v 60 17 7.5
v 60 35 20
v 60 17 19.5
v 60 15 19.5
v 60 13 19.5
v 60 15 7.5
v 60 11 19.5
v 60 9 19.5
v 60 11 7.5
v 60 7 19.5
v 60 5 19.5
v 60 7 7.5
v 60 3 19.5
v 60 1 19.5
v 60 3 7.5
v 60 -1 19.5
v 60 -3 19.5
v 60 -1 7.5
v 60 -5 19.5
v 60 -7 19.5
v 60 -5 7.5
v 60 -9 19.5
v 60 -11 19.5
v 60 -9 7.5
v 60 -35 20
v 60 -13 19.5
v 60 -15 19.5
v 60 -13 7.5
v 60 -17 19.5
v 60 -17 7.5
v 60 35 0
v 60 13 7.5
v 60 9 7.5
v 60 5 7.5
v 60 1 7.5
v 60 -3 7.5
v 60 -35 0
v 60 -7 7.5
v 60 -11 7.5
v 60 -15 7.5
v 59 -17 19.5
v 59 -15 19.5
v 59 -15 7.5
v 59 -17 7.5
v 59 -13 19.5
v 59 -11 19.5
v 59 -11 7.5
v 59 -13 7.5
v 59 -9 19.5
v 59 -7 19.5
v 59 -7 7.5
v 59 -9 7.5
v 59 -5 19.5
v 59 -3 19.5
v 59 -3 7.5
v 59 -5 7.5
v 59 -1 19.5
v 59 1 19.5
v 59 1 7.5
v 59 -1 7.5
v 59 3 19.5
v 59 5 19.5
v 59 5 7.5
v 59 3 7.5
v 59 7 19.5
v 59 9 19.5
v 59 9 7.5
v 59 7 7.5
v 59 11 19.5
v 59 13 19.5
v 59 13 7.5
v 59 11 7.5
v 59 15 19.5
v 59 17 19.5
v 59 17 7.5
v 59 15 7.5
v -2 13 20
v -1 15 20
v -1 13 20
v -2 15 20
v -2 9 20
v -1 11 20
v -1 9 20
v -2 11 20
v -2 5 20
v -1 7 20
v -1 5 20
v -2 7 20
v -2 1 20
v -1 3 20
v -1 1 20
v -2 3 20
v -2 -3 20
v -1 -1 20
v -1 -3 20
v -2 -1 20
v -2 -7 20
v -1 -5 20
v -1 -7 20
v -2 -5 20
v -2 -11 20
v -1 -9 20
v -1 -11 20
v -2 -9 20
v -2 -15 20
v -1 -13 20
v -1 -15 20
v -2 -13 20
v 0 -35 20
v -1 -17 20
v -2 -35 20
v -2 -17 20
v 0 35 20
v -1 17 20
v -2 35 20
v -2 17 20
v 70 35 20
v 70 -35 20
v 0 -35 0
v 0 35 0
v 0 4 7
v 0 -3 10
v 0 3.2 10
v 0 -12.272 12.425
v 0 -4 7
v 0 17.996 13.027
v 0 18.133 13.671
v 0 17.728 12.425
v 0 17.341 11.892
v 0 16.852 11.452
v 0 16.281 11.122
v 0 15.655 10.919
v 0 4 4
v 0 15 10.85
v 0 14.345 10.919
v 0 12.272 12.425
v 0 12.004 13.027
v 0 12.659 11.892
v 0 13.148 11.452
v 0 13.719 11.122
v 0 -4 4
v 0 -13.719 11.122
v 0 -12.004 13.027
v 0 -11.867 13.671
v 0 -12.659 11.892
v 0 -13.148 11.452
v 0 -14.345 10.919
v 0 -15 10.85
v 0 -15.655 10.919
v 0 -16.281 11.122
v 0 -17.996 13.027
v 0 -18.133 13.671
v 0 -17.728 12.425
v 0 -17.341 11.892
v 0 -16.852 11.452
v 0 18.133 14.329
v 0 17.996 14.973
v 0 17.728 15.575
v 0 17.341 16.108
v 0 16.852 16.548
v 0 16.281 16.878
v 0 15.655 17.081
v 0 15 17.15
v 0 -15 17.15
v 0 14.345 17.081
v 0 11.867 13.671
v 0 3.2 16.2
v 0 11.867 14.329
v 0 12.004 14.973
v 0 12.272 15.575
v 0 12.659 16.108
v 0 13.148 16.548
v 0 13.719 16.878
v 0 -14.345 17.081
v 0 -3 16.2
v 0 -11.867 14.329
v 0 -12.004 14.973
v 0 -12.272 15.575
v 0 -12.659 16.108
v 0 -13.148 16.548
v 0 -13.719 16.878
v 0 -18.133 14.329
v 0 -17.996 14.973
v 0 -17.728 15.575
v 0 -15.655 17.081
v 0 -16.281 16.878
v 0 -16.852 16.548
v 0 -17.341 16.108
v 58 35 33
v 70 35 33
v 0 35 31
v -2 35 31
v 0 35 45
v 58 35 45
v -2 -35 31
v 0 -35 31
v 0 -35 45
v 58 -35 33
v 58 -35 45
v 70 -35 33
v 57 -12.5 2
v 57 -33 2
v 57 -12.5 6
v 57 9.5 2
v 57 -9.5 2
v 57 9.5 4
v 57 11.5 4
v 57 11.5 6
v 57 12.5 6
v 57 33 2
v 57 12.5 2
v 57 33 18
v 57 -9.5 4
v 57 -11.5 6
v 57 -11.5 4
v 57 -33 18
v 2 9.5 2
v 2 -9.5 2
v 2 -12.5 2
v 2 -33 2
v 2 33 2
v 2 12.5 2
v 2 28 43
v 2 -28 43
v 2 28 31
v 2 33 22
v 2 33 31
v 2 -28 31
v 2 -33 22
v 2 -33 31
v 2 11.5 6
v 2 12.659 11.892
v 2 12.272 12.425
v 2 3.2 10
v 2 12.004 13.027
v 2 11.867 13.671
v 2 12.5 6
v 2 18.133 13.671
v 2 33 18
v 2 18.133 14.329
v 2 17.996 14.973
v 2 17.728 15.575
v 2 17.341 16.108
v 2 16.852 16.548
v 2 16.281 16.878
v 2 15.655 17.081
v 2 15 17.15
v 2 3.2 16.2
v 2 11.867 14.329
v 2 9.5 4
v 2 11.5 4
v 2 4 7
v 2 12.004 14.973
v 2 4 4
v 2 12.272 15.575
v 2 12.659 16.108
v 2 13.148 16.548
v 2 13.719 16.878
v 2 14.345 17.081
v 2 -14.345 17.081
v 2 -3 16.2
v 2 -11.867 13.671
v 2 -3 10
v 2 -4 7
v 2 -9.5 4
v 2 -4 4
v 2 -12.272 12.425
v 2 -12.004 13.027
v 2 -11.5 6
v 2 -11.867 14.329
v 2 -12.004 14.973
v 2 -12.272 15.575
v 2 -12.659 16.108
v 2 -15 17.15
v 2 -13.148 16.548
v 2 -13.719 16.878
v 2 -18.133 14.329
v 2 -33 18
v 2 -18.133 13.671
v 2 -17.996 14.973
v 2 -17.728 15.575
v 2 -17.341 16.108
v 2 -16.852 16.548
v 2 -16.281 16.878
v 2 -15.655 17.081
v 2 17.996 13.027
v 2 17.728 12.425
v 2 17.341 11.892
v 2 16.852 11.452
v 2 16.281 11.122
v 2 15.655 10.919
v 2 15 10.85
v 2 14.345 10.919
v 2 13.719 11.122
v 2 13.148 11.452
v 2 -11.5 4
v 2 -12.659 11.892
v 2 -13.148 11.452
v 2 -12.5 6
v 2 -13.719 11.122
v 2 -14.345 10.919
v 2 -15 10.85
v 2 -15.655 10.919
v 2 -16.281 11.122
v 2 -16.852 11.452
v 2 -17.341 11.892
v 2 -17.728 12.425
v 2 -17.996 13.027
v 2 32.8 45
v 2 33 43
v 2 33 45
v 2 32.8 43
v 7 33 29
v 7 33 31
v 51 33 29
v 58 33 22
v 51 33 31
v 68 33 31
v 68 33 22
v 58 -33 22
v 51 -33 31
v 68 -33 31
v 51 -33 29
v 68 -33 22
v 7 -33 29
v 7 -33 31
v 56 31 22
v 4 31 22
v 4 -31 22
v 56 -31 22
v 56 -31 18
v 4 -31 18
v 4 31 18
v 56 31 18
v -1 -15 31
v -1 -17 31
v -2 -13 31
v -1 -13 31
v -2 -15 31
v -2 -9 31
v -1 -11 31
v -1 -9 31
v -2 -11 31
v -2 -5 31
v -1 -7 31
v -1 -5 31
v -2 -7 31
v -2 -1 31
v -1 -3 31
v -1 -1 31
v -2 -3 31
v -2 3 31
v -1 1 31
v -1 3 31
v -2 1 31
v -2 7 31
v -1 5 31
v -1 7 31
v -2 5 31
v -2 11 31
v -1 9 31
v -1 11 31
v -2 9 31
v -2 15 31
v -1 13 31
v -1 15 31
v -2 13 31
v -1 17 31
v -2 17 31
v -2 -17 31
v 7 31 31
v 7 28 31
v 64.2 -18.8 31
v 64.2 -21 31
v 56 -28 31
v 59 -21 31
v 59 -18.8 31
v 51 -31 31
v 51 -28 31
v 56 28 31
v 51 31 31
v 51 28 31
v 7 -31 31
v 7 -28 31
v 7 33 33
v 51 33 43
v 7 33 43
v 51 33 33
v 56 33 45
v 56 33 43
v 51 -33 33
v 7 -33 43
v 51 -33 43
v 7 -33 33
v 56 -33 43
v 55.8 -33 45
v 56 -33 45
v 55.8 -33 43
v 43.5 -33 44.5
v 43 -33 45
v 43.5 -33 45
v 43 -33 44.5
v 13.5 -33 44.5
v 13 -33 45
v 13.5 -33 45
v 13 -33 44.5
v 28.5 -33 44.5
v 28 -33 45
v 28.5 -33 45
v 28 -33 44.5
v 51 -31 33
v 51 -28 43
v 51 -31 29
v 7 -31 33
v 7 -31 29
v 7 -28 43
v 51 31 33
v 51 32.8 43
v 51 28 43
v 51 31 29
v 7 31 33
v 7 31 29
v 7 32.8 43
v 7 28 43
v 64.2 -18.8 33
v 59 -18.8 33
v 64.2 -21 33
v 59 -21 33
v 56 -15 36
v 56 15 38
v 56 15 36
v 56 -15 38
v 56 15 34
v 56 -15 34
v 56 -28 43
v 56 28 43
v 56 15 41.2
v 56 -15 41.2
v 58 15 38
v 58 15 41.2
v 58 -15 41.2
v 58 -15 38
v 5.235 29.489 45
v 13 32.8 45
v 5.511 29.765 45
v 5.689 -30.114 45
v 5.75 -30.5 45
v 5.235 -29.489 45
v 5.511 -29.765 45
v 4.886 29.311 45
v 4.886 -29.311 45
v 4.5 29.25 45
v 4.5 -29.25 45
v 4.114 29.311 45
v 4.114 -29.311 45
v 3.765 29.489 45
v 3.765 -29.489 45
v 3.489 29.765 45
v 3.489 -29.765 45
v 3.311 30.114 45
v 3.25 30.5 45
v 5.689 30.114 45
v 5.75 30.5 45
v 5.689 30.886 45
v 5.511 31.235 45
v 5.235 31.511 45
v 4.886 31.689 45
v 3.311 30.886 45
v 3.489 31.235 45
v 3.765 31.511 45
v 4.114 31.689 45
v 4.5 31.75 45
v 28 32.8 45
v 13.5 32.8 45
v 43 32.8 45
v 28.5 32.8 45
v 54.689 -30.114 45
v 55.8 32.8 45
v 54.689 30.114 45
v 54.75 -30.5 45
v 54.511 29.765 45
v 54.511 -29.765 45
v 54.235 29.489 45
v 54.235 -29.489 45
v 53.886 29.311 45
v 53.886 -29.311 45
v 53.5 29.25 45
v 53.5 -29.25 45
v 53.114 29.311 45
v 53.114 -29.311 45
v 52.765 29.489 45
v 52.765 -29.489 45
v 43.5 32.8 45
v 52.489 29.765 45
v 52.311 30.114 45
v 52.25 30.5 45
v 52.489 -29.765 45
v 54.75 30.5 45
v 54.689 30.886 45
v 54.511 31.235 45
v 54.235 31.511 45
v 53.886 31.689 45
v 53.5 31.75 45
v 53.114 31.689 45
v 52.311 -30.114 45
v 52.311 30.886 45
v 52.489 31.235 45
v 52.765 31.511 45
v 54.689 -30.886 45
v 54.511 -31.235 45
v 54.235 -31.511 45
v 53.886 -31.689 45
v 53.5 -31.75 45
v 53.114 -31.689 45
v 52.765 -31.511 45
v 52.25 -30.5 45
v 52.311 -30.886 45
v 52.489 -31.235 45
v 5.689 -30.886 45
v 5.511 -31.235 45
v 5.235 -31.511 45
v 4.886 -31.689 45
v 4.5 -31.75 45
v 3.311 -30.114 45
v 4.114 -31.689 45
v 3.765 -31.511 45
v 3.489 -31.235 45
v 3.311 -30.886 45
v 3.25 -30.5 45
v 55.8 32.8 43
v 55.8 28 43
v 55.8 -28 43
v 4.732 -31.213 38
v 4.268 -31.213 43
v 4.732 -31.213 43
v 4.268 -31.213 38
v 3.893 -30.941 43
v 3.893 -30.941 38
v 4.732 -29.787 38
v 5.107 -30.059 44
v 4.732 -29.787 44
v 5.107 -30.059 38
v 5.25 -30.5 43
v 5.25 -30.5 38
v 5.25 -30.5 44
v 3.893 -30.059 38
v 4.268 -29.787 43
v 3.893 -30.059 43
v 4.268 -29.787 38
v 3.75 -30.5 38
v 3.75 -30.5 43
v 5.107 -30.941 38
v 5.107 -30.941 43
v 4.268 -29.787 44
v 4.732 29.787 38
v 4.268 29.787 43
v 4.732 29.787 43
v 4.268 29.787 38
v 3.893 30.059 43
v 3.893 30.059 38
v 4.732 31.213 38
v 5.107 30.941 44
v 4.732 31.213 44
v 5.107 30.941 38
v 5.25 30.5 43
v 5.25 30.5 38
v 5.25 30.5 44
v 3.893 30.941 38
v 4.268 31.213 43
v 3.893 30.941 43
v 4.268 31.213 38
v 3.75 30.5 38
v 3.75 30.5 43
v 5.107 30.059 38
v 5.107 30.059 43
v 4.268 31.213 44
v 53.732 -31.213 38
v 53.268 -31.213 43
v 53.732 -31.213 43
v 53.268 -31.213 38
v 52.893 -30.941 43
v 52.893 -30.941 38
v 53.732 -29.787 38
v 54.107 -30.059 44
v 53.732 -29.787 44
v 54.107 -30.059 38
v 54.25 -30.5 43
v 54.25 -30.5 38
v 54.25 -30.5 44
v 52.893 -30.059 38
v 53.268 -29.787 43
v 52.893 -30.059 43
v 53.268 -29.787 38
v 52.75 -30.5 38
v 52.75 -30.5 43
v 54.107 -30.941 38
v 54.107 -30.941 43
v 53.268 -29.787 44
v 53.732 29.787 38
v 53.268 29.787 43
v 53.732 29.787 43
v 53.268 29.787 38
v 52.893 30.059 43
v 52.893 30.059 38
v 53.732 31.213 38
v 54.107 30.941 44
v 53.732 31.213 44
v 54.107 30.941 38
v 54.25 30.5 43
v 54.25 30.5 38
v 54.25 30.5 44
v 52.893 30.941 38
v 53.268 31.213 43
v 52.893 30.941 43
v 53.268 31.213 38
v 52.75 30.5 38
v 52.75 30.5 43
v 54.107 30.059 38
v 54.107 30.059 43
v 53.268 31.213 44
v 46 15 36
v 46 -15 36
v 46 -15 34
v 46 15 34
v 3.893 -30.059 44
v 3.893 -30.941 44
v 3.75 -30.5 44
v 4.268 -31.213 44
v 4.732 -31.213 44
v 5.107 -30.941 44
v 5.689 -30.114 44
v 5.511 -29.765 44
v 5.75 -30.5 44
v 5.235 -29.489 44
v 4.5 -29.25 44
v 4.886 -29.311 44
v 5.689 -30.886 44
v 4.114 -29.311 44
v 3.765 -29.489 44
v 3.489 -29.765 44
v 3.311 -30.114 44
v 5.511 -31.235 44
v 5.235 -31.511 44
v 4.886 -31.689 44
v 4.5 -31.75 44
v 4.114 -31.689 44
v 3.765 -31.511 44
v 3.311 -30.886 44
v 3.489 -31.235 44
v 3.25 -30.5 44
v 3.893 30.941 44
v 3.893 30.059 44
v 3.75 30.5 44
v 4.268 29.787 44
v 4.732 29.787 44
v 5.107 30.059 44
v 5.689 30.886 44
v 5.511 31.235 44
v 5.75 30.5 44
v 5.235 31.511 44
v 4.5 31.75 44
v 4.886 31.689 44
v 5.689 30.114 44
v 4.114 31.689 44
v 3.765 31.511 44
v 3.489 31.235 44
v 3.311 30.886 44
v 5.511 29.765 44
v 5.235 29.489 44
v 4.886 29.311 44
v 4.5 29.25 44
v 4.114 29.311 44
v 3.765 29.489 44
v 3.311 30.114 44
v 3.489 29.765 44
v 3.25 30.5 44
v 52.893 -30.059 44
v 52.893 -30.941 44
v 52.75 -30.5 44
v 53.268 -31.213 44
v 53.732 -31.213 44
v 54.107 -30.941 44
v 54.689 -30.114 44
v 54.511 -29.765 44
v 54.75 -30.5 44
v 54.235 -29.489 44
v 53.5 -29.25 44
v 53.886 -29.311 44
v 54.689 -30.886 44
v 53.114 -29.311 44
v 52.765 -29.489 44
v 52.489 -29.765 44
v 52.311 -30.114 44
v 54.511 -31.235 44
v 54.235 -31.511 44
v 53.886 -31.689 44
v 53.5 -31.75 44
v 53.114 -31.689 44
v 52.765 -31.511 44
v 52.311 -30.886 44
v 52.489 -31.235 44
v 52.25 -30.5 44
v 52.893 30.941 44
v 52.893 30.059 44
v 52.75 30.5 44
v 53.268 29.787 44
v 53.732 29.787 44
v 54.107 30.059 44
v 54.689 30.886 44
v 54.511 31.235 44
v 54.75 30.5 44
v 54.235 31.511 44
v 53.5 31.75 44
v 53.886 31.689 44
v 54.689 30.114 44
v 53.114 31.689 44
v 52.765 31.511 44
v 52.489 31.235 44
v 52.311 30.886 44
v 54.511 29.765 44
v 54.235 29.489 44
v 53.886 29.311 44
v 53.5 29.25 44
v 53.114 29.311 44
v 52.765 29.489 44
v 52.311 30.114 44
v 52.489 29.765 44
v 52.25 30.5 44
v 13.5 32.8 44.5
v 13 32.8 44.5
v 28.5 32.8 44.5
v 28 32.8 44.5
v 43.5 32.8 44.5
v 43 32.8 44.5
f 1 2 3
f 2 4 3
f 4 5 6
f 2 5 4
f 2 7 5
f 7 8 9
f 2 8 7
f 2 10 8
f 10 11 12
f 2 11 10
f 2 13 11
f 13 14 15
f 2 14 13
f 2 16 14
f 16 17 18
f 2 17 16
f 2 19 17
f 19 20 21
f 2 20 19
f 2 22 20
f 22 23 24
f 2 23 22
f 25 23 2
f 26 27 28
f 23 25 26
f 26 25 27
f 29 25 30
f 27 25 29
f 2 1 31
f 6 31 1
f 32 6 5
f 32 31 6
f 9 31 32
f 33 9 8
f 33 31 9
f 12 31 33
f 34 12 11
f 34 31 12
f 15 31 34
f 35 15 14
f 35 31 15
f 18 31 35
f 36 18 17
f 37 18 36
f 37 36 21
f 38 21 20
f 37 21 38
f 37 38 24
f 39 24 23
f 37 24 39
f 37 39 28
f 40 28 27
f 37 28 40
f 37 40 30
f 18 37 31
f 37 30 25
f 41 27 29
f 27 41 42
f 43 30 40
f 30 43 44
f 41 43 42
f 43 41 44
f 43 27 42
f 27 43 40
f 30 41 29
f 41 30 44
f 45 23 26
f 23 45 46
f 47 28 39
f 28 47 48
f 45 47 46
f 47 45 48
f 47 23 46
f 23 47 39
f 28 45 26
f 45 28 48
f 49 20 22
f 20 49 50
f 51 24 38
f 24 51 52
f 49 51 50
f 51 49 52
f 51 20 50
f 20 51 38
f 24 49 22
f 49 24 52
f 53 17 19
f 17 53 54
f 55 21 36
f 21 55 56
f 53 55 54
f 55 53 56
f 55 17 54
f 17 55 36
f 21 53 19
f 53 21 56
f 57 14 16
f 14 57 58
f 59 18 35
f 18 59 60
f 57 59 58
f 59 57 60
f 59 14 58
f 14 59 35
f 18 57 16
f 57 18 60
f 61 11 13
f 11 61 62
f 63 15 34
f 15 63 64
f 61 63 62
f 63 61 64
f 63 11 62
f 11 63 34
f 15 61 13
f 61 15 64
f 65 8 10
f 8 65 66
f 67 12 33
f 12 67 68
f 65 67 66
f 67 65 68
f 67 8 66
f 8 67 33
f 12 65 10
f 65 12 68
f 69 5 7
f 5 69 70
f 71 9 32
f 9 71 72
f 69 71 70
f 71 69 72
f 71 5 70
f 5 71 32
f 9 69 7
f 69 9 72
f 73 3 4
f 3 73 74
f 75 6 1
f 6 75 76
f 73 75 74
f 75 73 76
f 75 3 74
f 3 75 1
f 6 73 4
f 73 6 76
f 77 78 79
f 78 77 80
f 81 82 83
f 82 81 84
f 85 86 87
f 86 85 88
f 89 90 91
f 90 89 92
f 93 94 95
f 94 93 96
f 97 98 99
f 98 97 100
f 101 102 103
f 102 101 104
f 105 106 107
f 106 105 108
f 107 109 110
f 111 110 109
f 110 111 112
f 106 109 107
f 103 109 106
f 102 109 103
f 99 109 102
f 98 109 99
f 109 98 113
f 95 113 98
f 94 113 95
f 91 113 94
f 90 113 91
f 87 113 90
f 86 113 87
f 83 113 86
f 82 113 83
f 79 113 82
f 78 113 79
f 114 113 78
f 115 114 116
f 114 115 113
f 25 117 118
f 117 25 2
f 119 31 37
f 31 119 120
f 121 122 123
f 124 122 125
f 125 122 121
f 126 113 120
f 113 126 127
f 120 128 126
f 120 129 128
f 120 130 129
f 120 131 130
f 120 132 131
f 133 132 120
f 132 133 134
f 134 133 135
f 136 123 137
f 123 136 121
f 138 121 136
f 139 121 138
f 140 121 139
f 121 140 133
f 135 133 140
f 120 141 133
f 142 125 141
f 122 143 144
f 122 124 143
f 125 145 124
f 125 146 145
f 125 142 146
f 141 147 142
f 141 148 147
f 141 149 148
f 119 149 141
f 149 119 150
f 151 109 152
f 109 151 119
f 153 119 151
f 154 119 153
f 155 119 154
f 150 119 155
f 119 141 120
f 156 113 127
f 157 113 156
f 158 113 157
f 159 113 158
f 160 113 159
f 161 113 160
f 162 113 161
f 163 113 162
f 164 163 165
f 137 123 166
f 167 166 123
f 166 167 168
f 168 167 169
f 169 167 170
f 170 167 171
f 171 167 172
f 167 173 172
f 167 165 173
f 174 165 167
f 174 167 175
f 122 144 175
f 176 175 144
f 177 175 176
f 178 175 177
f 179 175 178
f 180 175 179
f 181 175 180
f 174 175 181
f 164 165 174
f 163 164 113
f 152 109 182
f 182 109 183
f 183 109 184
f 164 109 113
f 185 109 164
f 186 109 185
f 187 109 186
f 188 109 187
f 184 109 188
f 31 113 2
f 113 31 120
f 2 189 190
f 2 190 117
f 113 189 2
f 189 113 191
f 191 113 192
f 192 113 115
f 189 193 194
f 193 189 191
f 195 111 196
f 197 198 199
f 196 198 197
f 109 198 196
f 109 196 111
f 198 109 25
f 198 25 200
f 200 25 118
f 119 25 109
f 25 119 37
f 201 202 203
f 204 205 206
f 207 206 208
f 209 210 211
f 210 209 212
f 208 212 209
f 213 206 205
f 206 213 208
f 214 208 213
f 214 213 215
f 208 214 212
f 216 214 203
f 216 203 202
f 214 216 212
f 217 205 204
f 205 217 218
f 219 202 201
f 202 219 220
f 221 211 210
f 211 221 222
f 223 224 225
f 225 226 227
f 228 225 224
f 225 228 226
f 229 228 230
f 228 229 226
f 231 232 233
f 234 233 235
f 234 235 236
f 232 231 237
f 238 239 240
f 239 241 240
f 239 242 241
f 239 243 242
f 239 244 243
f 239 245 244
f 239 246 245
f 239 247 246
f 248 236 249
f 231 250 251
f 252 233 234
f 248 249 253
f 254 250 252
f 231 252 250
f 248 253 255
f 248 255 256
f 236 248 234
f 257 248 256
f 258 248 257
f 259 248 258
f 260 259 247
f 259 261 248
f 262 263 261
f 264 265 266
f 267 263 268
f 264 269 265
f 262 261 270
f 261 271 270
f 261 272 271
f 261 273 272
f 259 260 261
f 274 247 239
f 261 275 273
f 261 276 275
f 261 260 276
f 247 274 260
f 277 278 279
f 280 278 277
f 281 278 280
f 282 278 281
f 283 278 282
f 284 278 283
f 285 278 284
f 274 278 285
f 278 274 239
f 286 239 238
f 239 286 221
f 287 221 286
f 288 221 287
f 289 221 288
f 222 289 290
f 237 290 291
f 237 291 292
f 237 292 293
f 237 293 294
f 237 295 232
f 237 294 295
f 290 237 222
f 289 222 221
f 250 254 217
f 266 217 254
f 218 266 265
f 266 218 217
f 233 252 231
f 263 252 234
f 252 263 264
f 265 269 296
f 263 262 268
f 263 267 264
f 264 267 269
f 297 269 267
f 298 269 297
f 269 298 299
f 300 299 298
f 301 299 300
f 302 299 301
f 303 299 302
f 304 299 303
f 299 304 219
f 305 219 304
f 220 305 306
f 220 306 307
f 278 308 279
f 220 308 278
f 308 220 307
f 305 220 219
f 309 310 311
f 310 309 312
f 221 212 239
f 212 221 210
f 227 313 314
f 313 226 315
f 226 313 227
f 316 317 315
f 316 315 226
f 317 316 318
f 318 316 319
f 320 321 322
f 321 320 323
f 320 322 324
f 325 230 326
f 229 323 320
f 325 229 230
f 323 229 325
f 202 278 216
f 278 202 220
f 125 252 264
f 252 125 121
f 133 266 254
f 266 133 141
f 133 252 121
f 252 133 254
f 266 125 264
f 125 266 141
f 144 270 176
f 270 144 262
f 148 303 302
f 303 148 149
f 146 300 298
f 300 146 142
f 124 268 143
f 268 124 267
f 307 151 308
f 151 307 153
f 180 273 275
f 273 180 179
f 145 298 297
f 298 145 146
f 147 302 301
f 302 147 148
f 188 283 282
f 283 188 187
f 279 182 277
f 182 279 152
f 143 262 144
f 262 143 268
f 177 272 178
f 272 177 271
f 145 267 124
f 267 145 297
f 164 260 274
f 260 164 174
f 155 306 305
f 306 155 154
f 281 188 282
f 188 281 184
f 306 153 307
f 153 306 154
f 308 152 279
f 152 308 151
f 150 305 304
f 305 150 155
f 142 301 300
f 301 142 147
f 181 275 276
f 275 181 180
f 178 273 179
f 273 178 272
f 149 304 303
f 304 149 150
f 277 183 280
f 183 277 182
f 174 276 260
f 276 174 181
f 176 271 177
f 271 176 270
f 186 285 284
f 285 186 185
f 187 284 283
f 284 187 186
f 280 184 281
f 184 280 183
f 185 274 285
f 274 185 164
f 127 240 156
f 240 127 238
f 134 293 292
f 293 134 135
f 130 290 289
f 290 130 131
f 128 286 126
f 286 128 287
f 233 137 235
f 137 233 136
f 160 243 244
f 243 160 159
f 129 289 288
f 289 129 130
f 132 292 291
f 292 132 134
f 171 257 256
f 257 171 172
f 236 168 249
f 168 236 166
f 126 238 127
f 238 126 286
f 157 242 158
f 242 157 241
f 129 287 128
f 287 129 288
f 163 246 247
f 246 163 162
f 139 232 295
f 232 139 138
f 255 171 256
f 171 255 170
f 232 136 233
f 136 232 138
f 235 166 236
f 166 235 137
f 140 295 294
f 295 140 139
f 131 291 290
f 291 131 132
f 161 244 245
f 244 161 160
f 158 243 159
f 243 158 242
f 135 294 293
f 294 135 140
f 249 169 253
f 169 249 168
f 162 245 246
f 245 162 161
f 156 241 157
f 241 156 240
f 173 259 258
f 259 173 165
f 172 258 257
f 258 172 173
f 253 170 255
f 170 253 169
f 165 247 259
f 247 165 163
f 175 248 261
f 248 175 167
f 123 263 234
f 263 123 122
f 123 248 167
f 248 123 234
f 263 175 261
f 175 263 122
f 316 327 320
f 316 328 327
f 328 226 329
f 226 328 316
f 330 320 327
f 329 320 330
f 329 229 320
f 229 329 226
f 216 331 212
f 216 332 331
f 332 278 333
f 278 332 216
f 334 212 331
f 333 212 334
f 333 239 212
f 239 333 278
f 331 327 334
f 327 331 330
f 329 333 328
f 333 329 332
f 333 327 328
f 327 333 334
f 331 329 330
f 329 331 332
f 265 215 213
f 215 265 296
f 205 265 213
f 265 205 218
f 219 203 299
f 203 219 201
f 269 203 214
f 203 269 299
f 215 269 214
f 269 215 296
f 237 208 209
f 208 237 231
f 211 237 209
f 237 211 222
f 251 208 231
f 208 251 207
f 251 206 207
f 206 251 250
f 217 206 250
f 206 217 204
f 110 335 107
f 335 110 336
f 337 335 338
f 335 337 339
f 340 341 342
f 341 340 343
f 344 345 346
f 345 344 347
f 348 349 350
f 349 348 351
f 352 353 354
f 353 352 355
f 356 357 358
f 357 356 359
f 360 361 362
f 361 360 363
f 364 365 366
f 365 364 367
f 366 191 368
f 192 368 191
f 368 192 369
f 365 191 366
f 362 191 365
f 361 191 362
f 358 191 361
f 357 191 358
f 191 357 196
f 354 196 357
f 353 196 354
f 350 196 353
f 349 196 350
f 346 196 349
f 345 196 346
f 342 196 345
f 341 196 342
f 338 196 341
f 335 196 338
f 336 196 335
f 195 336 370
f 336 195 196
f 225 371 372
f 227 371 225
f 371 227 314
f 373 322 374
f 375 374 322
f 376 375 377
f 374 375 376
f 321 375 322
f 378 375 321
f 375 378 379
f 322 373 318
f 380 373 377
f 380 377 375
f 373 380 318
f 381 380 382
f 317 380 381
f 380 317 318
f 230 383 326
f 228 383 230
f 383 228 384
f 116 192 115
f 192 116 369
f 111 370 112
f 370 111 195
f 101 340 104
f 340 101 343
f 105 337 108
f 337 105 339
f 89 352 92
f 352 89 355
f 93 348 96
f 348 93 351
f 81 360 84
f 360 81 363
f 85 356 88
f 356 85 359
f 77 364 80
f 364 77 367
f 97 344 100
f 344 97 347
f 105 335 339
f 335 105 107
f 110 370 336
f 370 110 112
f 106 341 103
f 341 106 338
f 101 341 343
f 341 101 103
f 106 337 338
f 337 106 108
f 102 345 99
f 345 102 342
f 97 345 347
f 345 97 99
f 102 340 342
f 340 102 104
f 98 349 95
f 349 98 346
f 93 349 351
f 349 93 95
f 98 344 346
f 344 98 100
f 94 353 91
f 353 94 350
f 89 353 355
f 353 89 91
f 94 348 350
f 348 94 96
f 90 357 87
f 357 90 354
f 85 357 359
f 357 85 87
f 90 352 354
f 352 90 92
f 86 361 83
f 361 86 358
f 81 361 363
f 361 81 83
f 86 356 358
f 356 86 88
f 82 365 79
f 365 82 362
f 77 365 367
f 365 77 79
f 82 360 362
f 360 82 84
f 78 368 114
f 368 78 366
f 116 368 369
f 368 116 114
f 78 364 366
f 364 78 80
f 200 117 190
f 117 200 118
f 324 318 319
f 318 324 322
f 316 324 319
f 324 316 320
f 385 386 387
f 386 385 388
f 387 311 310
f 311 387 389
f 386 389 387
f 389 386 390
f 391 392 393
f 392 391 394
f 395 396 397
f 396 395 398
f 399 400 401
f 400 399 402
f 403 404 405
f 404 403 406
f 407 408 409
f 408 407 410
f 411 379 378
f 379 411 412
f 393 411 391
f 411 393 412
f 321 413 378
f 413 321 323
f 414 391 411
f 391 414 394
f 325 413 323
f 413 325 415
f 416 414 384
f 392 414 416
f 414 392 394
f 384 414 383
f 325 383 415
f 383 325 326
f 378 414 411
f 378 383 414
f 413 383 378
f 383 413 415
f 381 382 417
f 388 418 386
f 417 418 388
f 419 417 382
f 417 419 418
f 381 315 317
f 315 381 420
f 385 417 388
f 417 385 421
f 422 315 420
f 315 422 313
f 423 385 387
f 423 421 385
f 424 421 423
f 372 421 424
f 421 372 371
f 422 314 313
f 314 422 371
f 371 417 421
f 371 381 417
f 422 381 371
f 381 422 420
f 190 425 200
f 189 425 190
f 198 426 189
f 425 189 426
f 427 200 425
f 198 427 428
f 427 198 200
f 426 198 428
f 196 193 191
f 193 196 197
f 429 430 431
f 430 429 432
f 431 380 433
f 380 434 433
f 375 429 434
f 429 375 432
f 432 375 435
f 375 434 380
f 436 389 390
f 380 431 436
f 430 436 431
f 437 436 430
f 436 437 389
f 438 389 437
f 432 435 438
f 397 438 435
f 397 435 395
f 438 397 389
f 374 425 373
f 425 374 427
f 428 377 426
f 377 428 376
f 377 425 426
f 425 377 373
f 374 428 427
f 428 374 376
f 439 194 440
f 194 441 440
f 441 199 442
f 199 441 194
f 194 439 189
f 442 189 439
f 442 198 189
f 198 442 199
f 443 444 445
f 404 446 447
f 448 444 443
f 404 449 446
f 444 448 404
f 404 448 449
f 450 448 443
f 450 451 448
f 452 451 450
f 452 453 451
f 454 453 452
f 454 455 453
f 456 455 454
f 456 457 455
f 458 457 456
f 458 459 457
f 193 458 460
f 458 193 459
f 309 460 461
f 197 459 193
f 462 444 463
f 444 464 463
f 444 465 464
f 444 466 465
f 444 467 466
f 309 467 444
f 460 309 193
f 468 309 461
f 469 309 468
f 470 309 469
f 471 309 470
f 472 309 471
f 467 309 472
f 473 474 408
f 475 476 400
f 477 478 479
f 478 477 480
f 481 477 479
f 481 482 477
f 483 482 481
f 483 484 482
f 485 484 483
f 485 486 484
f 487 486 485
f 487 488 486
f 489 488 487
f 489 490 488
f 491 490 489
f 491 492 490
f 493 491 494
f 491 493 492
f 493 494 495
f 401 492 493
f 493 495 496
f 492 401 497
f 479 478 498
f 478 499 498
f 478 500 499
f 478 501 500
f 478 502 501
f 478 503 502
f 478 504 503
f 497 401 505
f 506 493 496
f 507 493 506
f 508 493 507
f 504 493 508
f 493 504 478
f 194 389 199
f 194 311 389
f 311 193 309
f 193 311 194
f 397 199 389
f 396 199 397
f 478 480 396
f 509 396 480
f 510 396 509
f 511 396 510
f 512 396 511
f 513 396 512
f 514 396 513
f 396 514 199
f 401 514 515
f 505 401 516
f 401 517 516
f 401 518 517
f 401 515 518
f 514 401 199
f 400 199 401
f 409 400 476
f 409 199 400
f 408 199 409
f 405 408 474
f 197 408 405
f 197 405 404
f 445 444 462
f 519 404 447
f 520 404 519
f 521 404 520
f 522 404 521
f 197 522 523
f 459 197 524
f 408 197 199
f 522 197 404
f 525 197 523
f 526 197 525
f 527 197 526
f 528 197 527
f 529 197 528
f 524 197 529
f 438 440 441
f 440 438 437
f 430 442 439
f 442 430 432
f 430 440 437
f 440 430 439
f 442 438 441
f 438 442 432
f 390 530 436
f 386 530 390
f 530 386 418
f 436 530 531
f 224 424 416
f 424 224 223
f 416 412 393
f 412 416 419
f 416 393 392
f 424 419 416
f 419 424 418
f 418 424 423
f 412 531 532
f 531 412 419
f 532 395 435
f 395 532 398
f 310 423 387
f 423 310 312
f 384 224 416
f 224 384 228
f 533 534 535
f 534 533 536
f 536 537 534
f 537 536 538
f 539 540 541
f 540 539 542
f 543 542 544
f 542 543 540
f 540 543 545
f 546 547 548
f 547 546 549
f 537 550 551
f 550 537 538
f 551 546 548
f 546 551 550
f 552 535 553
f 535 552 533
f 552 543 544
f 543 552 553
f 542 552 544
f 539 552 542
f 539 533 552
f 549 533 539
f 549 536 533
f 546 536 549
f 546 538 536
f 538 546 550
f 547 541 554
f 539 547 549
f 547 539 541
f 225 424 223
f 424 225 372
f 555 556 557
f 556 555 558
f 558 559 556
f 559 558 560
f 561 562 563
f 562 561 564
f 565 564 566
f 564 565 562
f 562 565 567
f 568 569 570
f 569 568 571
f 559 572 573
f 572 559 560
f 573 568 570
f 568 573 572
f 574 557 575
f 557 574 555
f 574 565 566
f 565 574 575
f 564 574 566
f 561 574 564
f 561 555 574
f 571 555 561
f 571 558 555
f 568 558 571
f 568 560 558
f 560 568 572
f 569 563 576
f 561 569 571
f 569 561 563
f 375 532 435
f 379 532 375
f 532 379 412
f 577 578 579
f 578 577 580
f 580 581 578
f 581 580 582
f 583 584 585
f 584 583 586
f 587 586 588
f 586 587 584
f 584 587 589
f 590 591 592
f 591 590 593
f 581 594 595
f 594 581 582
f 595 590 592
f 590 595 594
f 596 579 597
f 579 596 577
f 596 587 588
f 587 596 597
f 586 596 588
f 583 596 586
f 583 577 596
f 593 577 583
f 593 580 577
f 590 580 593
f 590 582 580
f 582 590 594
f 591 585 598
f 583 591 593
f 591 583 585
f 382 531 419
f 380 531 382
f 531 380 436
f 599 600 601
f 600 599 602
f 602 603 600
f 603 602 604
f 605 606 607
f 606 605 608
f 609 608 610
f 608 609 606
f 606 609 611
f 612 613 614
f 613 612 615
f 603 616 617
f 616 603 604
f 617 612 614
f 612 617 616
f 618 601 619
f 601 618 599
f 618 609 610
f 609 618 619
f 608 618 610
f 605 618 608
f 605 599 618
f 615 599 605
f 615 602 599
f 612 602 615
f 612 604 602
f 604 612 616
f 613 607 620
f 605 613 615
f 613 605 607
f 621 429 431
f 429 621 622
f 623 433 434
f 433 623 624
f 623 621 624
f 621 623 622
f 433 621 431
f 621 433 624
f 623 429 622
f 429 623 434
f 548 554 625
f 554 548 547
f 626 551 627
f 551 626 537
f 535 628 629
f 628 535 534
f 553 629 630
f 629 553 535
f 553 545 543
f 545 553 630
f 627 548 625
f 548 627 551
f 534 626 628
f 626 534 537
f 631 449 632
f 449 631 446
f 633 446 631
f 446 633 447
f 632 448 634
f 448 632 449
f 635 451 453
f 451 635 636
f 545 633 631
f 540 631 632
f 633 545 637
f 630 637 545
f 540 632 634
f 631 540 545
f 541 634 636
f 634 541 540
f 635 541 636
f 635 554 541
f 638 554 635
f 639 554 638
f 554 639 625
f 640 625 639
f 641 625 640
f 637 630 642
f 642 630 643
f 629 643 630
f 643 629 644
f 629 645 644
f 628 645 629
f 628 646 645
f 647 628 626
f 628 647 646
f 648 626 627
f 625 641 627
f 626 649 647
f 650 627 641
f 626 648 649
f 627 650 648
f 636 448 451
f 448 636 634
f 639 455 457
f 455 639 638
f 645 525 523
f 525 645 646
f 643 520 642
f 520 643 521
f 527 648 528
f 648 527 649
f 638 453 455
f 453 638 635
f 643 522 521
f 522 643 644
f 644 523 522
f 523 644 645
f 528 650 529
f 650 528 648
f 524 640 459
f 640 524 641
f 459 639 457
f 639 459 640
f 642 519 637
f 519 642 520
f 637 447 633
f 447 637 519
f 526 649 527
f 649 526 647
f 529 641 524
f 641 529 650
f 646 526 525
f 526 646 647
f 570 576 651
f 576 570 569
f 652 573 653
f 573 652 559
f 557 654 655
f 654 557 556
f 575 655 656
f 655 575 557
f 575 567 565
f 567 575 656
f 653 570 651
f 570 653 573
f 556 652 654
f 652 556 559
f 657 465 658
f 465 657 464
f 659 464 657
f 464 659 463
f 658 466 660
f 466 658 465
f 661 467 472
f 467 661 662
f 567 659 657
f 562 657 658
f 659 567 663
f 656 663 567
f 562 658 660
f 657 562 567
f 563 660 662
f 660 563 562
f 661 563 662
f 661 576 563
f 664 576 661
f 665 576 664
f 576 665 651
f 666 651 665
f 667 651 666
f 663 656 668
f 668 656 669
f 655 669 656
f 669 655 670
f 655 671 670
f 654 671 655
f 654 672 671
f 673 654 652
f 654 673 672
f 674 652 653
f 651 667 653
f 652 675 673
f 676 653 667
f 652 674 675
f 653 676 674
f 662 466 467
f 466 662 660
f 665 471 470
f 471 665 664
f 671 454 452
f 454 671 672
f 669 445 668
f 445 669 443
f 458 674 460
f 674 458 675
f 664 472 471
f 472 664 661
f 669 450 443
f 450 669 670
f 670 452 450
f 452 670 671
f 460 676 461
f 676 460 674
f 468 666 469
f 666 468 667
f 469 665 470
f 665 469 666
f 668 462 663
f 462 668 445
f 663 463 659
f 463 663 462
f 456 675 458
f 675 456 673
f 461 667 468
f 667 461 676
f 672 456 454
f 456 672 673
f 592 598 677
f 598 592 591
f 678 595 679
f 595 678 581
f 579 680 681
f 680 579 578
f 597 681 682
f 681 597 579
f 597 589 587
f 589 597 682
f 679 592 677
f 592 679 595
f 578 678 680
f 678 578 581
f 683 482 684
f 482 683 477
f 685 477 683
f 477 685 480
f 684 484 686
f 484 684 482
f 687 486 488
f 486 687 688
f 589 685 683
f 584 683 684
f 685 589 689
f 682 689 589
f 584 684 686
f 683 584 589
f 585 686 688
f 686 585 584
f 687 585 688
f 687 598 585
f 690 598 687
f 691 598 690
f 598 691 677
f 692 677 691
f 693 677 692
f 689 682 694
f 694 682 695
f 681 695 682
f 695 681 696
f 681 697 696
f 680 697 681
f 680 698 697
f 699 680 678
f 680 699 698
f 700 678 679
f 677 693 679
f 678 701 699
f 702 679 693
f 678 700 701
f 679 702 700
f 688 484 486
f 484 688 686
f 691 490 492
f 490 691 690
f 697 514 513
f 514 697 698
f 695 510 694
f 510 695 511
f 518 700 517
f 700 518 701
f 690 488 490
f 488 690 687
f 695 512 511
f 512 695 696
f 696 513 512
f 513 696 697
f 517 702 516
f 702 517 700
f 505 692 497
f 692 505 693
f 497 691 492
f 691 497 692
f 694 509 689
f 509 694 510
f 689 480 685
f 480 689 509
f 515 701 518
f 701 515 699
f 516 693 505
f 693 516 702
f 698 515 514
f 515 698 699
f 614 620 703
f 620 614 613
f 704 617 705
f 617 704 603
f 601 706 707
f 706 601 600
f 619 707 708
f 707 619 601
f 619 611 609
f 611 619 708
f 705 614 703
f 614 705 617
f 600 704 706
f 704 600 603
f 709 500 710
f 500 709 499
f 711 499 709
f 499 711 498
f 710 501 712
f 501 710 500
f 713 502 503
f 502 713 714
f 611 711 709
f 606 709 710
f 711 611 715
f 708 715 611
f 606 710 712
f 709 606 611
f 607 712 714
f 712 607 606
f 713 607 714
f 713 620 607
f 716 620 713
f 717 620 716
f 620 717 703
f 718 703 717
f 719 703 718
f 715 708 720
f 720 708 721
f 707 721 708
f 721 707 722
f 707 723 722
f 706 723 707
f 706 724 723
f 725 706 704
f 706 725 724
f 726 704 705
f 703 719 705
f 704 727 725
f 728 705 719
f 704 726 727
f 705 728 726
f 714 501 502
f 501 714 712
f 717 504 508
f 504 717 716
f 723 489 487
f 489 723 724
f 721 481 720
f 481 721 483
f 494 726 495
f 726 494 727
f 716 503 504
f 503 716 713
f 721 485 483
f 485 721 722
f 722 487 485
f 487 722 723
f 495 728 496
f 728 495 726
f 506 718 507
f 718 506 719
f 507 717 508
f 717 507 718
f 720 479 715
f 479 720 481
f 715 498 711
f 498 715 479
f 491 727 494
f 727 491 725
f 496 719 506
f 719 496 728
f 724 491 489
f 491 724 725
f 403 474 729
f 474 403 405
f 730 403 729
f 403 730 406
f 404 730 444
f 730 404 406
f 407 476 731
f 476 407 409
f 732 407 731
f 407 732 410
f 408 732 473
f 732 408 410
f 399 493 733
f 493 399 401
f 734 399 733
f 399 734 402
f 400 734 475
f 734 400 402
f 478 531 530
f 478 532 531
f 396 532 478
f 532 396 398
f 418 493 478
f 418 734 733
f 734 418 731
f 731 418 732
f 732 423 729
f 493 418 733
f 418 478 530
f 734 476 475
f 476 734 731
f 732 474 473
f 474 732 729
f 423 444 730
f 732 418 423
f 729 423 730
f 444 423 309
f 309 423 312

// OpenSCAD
//QL Fileserver Case

translate([0,-35,0]){
    bottom();
    translate([-2,0,20]) middle();
    translate([0,2,31]) top();
    translate([2,2,43]) lid();
}



module bottom(){
    difference(){
       cube([60,70,20]);
        translate([2,2,2]) cube([55,66,18]);
        translate([-1,31,4]) BluePill_usb();
        translate([-1,20,14]) jack();
        translate([-1,50,14]) jack();
        translate([-1,32,10]) reset_button();
        translate([59,18,7.5]) vent_slot();
    }
    difference(){
        translate([2,2,18]) cube([56,66,4]);
        translate([4,4,18]) cube([52,62,5]);
    }
    translate([2,22.5,2]) BluePill_mount();
    
}

module middle(){
    difference(){
        cube([72,70,11]);
            translate ([4,2,2]) cube([66,66,9]);
            translate([4,2,0]) cube([56,66,18]);
            translate([-0,18,0]) vent_slot_back();
    }
   translate([9,2,9])  cube([44,2,4]);
   translate([9,66,9])  cube([44,2,4]);
}

module top(){
    difference(){
        translate([0,-2,0]) cube([70,70,2]);
        translate([2,0,0]) cube([54,66,2]);
        translate([59,12,-8]) led();
    }
    difference(){
        translate([0,-2,2]) cube([58,70,12]);
        translate([2,0,0]) cube([54,66,15]);
        translate([54,18,7]) sdslot();
    }
    translate([46,18,3]) cube([10,30,2]);
    translate([2,0,0]) lid_mounting();
    translate([2,61,0]) lid_mounting();
    translate([51,0,0]) lid_mounting();
    translate([51,61,0]) lid_mounting();
}

module lid(){
    difference(){
       cube([53.8,65.8,2]);
        translate([2,0,0])  lid_hole();
        translate([2,61,0]) lid_hole();
        translate([51,0,0]) lid_hole();
        translate([51,61,0]) lid_hole();
        for(a=[11:15:50]) translate([a,0,1.5]) #cube([0.5,66,0.5]);
       
    }
    translate([7,26,3]) logo();
}

module logo(){
    rotate([0,0,90])
    scale([0.1, 0.1, 0.01])
    surface(file = "sinclair-logo.png", center = true, invert = true);
}

module BluePill_mount(){
    cube([55,3,2]);
    cube([55,1,4]);
    translate([0,24,0]) cube([55,1,4]);
    translate([0,22,0]) cube([55,3,2]);
}

module BluePill_usb(){
    #cube([5,8,3]);
}

module lid_hole(){
    #translate([0.5,2.5,0]) {
        cylinder(h=2,d=1.5,$fn=10);
        translate([0,0,1]) cylinder(h=1,d=2.5,$fn=20);
    }
}

module lid_mounting(){
    difference(){
        cube([5,5,12]);
        #translate([2.5,2.5,7]) cylinder(h=5,d=1.5,$fn=10);
    }
}
module sdslot(){
    #cube([5,30,3.2]);
}

module led(){
    #cube([5.2,2.2,10]);
}

module jack(){
    #rotate([0,90,0]) cylinder(d=6.3,h=6,$fn=30);
}

module reset_button(){
    #cube([4,6.2,6.2]);
}
module vent_slot(){
    for(a=[0:4:35]) translate([0,a,0]) #cube([1,2,12]);
}

module vent_slot_back(){
    for(a=[0:4:35]){
        translate([0,a,0]) #cube([1,2,11]);
    }
}
